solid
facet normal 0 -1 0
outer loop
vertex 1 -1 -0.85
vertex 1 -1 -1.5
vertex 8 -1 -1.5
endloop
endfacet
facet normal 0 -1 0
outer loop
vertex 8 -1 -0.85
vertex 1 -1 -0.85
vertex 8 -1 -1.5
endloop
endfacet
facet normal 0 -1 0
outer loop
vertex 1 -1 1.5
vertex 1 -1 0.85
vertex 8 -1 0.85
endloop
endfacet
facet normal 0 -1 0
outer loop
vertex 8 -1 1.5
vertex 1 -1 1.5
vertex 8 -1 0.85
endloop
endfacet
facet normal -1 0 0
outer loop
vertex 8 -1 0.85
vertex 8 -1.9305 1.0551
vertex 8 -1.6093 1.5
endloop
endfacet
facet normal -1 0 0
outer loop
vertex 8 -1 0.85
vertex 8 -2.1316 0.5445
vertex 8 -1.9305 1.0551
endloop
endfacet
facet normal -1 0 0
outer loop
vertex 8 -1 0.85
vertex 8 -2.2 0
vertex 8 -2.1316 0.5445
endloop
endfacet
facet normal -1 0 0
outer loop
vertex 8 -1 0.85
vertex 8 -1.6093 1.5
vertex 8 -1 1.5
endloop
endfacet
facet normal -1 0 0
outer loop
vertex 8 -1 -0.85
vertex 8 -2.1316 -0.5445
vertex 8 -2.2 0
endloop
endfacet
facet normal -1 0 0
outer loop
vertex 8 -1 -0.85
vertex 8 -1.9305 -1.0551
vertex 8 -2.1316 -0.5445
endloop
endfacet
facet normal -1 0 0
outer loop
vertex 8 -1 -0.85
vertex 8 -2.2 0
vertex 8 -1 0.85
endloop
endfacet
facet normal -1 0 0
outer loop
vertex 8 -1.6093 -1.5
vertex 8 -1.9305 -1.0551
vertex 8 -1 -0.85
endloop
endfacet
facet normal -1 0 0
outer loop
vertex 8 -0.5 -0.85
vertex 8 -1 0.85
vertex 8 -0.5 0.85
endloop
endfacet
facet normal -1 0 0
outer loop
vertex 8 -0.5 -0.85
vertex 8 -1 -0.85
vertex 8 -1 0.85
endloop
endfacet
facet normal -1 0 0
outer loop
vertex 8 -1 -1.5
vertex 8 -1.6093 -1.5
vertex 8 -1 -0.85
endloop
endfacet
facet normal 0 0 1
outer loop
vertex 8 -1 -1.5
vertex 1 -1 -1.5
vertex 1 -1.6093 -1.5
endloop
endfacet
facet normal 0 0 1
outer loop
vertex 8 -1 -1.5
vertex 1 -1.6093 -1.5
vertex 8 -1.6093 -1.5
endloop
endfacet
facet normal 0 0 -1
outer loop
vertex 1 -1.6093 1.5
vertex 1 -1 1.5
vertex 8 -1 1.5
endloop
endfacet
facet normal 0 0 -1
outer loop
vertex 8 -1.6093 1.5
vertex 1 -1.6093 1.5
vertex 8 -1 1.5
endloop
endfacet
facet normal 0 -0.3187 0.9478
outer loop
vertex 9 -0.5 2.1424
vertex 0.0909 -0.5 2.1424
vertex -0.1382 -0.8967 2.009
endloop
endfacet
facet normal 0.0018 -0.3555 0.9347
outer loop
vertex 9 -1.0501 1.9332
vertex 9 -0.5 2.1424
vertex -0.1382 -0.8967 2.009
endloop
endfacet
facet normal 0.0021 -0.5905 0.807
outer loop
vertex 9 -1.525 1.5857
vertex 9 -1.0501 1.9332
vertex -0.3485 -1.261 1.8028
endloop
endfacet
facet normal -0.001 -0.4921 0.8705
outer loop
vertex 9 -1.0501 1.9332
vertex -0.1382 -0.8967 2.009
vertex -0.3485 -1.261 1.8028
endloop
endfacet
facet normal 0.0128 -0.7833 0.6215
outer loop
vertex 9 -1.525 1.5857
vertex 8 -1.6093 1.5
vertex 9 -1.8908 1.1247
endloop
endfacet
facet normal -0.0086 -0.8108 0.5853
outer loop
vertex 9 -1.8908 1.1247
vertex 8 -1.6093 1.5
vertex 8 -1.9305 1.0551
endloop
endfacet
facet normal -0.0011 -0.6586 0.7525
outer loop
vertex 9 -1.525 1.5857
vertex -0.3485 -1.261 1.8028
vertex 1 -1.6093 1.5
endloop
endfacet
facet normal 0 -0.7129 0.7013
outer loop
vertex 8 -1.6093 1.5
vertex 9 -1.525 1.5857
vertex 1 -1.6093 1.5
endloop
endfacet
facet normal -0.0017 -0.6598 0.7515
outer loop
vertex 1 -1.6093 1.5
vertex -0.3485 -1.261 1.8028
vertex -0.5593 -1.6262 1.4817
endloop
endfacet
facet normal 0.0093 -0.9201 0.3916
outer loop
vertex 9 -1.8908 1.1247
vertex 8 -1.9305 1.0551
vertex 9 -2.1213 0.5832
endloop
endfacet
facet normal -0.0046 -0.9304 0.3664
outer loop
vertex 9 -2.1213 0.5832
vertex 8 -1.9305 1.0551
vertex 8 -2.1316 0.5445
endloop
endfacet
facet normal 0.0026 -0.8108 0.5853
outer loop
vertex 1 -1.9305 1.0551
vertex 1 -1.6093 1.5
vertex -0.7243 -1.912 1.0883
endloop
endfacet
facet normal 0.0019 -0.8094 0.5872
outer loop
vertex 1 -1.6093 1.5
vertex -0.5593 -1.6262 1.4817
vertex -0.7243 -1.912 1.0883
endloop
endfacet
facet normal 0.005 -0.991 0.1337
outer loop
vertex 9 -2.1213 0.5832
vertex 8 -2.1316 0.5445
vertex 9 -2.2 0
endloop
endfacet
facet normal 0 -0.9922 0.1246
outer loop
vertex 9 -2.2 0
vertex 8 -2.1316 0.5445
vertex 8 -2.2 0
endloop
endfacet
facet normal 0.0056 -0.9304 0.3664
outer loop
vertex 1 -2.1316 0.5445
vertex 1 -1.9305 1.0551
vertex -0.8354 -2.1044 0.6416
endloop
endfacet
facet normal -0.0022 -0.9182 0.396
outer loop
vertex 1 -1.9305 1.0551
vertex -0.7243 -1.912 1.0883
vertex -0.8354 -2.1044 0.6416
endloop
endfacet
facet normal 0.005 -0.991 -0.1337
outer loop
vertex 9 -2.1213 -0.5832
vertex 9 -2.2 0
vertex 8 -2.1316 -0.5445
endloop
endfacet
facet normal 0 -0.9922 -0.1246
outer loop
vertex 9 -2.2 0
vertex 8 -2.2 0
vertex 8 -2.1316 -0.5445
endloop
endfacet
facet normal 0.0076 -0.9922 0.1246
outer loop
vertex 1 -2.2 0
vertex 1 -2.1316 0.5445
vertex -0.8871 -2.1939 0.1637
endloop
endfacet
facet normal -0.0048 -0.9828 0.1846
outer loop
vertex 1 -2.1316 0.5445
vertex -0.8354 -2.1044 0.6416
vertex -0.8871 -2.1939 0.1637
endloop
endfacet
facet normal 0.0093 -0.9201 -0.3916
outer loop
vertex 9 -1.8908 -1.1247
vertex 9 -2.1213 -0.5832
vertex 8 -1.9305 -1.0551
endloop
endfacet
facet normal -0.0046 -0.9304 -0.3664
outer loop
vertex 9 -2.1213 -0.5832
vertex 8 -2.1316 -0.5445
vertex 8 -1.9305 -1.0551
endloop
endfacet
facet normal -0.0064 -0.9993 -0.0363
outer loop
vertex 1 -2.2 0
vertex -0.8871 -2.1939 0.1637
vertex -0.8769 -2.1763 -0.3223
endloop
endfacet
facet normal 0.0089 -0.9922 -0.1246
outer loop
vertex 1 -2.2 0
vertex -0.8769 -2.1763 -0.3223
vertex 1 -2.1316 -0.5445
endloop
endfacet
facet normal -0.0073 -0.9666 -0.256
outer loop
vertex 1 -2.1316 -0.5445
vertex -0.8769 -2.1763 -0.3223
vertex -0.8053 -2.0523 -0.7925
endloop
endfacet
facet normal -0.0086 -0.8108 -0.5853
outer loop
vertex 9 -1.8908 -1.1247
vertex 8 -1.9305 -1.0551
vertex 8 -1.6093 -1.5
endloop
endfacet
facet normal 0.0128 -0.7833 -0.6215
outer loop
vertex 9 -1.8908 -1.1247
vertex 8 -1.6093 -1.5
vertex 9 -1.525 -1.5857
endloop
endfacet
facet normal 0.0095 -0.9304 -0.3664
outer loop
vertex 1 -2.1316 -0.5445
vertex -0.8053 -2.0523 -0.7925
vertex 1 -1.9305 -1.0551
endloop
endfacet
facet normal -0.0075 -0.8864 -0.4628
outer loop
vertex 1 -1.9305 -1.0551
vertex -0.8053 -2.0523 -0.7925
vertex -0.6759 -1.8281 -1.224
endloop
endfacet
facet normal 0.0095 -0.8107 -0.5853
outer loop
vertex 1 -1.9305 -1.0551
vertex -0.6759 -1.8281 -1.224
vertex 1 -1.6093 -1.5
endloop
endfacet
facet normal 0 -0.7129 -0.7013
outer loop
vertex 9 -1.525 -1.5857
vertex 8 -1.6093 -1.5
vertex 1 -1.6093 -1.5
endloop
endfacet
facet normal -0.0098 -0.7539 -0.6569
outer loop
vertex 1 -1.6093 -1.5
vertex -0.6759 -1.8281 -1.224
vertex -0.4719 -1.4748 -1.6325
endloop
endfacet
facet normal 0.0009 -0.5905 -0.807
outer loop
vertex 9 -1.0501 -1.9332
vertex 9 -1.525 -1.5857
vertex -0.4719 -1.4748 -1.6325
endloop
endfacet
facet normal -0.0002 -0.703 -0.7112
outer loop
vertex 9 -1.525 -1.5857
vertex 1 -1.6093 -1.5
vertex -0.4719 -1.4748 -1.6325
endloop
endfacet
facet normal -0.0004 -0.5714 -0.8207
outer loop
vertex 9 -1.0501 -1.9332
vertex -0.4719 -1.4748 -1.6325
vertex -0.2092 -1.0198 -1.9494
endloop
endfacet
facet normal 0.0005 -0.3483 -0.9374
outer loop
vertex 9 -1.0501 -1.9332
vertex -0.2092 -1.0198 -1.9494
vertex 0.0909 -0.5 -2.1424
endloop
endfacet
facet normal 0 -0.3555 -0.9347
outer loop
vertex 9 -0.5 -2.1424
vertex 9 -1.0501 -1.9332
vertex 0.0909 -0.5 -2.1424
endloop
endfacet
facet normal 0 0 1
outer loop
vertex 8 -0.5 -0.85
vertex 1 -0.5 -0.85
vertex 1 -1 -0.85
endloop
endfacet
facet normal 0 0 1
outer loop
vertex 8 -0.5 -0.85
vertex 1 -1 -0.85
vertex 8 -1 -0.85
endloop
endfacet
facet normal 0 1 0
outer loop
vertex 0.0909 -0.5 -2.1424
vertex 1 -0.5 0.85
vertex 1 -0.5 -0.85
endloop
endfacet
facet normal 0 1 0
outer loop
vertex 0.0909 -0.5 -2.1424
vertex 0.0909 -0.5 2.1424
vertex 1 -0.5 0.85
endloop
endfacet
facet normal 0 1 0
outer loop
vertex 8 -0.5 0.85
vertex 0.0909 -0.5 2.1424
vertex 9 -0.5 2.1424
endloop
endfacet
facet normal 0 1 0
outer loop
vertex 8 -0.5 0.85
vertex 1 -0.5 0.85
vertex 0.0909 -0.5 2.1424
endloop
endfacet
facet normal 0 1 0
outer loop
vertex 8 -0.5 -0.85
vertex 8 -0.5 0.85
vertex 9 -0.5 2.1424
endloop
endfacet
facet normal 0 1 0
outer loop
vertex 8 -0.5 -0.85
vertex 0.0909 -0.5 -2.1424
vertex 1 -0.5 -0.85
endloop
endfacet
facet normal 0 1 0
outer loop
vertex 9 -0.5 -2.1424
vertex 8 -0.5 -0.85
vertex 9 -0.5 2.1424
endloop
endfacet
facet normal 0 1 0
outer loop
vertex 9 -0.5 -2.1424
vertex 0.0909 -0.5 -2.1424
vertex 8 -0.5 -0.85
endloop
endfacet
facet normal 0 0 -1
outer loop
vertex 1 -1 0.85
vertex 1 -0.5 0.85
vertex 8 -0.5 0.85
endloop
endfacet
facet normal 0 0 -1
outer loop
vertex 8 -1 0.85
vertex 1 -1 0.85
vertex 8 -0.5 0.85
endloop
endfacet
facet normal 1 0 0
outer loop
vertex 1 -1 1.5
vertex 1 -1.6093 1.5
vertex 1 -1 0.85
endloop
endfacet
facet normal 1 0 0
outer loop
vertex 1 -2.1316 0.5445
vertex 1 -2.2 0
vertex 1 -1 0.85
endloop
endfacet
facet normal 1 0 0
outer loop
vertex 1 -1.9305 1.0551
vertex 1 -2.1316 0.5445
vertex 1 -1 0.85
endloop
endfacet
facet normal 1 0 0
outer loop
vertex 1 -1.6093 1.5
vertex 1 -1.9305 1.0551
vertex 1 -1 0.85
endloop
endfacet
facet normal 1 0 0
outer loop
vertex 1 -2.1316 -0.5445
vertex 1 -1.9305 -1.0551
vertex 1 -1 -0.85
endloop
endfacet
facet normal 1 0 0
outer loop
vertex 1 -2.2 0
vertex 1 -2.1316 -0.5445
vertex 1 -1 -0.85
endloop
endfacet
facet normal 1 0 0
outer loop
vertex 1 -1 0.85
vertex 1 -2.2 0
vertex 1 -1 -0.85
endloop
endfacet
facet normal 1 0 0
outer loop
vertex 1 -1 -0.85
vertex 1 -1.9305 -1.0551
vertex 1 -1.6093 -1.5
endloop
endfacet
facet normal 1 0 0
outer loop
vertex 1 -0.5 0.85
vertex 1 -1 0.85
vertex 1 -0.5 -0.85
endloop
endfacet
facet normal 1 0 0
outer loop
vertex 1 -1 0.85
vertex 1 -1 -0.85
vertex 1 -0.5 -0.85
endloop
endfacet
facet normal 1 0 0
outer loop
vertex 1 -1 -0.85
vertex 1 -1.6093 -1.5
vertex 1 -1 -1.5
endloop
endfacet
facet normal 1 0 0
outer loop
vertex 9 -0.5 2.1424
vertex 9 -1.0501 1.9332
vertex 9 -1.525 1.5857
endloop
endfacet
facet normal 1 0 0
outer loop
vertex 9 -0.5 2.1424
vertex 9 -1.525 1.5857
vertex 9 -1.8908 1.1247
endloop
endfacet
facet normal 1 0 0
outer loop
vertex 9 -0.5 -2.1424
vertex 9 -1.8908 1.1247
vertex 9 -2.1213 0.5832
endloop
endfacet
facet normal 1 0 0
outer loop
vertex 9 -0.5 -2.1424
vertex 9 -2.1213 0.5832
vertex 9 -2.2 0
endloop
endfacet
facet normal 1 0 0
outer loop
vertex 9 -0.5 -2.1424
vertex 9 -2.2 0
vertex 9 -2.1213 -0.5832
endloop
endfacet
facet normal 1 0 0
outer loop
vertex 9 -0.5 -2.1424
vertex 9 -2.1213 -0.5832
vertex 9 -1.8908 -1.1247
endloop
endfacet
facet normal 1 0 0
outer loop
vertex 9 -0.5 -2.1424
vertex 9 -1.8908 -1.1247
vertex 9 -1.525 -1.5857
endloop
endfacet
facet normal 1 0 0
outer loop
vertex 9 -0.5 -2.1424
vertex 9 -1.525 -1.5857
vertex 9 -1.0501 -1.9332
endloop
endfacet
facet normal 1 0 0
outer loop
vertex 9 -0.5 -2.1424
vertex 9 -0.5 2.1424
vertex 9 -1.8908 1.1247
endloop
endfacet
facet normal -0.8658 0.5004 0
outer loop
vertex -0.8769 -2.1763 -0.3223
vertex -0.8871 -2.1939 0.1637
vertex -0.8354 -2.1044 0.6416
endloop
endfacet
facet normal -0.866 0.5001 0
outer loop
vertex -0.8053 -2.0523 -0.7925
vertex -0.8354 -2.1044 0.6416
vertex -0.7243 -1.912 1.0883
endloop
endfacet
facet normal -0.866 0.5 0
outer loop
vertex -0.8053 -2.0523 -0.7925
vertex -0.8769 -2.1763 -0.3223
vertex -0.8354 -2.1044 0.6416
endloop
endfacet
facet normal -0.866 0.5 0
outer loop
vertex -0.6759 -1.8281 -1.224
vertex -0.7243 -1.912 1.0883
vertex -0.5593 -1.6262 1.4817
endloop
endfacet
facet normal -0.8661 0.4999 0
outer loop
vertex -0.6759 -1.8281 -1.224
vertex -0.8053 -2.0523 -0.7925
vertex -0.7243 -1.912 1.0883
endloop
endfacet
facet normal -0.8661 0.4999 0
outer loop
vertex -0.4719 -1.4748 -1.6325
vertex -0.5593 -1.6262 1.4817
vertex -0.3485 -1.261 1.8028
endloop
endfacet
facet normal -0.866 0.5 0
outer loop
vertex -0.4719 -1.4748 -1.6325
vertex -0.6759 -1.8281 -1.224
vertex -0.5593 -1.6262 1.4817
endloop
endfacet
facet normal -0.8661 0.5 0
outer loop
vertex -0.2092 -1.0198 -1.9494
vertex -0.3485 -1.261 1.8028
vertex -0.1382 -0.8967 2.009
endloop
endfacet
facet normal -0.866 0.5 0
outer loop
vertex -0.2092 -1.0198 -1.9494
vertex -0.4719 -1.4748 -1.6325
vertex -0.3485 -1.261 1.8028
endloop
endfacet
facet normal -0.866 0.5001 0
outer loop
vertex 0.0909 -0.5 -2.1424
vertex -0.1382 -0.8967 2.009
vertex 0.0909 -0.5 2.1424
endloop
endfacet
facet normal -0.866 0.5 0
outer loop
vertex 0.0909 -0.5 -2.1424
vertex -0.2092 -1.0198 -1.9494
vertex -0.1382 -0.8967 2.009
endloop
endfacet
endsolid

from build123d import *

# Parameters (mm, degrees)
BOX003_W               = 14
BOX003_H               = 10
BOX003_DEPTH           = 10
BOX003_PLACEMENT_ANGLE = 60
BOX002_W               = 7
BOX002_H               = 1.6
BOX002_DEPTH           = 3
BOX001_W               = 7
BOX001_H               = 5
BOX001_DEPTH           = 1.7
BOX_W                  = 14
BOX_H                  = 7
BOX_DEPTH              = 10
CYLINDER_R             = 2.2
CYLINDER_DEPTH         = 13


with BuildPart() as w_rfel003:
    # Box003 → Box003 (new body)
    with BuildSketch(Plane.XY):
        with Locations((7, 5)):
            Rectangle(BOX003_W, BOX003_H)
    extrude(amount=BOX003_DEPTH)


with BuildPart() as w_rfel003_1:
    # Box003 placement: moved
    add(w_rfel003.part.moved(Location((-3.2, -6.2, -4))).rotate(Axis((-3.2, -6.2, -4), (0, 0, 1)), BOX003_PLACEMENT_ANGLE))


with BuildPart() as w_rfel002:
    # Box002 → Box002 (new body)
    with BuildSketch(Plane(origin=(1, -2.6, -1.5), x_dir=(1, 0, 0), z_dir=(0, 0, 1))):
        with Locations((3.5, 0.8)):
            Rectangle(BOX002_W, BOX002_H)
    extrude(amount=BOX002_DEPTH)


with BuildPart() as w_rfel001:
    # Box001 → Box001 (new body)
    with BuildSketch(Plane(origin=(1, -4, -0.85), x_dir=(1, 0, 0), z_dir=(0, 0, 1))):
        with Locations((3.5, 2.5)):
            Rectangle(BOX001_W, BOX001_H)
    extrude(amount=BOX001_DEPTH)


with BuildPart() as w_rfel:
    # Box → Box (new body)
    with BuildSketch(Plane(origin=(-4, -0.5, -4), x_dir=(1, 0, 0), z_dir=(0, 0, 1))):
        with Locations((7, 3.5)):
            Rectangle(BOX_W, BOX_H)
    extrude(amount=BOX_DEPTH)


with BuildPart() as body:
    # Sketch → Revolution (revolve)
    with BuildSketch(Plane.XY):
        with BuildLine():
            add(Edge.make_bspline(
                [(1.699821, 2.2), (2.24, 1.1), (2.24, 0)],
                knots=[-2.2, -2.2, -2.2, 0, 0, 0], degree=2))
            Line((2.24, 0), (1.699821, 0))
            Line((1.699821, 0), (1.699821, 2.2))
        make_face()
    revolve(axis=Axis((0, 0, 0), (1, 0, 0)))


with BuildPart() as body_1:
    # Body placement: moved
    add(body.part.moved(Location((-1.7, 20, 0))))


with BuildPart() as cut004:
    # Cylinder → Cylinder (new body)
    with BuildSketch(Plane(origin=(-4, 0, 0), x_dir=(0, 0, -1), z_dir=(1, 0, 0))):
        Circle(CYLINDER_R)
    extrude(amount=CYLINDER_DEPTH)

    # Cut: cut Body
    add(body_1.part, mode=Mode.SUBTRACT)

    # Cut001: cut Würfel
    add(w_rfel.part, mode=Mode.SUBTRACT)

    # Cut002: cut Würfel001
    add(w_rfel001.part, mode=Mode.SUBTRACT)

    # Cut003: cut Würfel002
    add(w_rfel002.part, mode=Mode.SUBTRACT)

    # Cut004: cut Würfel003
    add(w_rfel003_1.part, mode=Mode.SUBTRACT)


solid = cut004.part
